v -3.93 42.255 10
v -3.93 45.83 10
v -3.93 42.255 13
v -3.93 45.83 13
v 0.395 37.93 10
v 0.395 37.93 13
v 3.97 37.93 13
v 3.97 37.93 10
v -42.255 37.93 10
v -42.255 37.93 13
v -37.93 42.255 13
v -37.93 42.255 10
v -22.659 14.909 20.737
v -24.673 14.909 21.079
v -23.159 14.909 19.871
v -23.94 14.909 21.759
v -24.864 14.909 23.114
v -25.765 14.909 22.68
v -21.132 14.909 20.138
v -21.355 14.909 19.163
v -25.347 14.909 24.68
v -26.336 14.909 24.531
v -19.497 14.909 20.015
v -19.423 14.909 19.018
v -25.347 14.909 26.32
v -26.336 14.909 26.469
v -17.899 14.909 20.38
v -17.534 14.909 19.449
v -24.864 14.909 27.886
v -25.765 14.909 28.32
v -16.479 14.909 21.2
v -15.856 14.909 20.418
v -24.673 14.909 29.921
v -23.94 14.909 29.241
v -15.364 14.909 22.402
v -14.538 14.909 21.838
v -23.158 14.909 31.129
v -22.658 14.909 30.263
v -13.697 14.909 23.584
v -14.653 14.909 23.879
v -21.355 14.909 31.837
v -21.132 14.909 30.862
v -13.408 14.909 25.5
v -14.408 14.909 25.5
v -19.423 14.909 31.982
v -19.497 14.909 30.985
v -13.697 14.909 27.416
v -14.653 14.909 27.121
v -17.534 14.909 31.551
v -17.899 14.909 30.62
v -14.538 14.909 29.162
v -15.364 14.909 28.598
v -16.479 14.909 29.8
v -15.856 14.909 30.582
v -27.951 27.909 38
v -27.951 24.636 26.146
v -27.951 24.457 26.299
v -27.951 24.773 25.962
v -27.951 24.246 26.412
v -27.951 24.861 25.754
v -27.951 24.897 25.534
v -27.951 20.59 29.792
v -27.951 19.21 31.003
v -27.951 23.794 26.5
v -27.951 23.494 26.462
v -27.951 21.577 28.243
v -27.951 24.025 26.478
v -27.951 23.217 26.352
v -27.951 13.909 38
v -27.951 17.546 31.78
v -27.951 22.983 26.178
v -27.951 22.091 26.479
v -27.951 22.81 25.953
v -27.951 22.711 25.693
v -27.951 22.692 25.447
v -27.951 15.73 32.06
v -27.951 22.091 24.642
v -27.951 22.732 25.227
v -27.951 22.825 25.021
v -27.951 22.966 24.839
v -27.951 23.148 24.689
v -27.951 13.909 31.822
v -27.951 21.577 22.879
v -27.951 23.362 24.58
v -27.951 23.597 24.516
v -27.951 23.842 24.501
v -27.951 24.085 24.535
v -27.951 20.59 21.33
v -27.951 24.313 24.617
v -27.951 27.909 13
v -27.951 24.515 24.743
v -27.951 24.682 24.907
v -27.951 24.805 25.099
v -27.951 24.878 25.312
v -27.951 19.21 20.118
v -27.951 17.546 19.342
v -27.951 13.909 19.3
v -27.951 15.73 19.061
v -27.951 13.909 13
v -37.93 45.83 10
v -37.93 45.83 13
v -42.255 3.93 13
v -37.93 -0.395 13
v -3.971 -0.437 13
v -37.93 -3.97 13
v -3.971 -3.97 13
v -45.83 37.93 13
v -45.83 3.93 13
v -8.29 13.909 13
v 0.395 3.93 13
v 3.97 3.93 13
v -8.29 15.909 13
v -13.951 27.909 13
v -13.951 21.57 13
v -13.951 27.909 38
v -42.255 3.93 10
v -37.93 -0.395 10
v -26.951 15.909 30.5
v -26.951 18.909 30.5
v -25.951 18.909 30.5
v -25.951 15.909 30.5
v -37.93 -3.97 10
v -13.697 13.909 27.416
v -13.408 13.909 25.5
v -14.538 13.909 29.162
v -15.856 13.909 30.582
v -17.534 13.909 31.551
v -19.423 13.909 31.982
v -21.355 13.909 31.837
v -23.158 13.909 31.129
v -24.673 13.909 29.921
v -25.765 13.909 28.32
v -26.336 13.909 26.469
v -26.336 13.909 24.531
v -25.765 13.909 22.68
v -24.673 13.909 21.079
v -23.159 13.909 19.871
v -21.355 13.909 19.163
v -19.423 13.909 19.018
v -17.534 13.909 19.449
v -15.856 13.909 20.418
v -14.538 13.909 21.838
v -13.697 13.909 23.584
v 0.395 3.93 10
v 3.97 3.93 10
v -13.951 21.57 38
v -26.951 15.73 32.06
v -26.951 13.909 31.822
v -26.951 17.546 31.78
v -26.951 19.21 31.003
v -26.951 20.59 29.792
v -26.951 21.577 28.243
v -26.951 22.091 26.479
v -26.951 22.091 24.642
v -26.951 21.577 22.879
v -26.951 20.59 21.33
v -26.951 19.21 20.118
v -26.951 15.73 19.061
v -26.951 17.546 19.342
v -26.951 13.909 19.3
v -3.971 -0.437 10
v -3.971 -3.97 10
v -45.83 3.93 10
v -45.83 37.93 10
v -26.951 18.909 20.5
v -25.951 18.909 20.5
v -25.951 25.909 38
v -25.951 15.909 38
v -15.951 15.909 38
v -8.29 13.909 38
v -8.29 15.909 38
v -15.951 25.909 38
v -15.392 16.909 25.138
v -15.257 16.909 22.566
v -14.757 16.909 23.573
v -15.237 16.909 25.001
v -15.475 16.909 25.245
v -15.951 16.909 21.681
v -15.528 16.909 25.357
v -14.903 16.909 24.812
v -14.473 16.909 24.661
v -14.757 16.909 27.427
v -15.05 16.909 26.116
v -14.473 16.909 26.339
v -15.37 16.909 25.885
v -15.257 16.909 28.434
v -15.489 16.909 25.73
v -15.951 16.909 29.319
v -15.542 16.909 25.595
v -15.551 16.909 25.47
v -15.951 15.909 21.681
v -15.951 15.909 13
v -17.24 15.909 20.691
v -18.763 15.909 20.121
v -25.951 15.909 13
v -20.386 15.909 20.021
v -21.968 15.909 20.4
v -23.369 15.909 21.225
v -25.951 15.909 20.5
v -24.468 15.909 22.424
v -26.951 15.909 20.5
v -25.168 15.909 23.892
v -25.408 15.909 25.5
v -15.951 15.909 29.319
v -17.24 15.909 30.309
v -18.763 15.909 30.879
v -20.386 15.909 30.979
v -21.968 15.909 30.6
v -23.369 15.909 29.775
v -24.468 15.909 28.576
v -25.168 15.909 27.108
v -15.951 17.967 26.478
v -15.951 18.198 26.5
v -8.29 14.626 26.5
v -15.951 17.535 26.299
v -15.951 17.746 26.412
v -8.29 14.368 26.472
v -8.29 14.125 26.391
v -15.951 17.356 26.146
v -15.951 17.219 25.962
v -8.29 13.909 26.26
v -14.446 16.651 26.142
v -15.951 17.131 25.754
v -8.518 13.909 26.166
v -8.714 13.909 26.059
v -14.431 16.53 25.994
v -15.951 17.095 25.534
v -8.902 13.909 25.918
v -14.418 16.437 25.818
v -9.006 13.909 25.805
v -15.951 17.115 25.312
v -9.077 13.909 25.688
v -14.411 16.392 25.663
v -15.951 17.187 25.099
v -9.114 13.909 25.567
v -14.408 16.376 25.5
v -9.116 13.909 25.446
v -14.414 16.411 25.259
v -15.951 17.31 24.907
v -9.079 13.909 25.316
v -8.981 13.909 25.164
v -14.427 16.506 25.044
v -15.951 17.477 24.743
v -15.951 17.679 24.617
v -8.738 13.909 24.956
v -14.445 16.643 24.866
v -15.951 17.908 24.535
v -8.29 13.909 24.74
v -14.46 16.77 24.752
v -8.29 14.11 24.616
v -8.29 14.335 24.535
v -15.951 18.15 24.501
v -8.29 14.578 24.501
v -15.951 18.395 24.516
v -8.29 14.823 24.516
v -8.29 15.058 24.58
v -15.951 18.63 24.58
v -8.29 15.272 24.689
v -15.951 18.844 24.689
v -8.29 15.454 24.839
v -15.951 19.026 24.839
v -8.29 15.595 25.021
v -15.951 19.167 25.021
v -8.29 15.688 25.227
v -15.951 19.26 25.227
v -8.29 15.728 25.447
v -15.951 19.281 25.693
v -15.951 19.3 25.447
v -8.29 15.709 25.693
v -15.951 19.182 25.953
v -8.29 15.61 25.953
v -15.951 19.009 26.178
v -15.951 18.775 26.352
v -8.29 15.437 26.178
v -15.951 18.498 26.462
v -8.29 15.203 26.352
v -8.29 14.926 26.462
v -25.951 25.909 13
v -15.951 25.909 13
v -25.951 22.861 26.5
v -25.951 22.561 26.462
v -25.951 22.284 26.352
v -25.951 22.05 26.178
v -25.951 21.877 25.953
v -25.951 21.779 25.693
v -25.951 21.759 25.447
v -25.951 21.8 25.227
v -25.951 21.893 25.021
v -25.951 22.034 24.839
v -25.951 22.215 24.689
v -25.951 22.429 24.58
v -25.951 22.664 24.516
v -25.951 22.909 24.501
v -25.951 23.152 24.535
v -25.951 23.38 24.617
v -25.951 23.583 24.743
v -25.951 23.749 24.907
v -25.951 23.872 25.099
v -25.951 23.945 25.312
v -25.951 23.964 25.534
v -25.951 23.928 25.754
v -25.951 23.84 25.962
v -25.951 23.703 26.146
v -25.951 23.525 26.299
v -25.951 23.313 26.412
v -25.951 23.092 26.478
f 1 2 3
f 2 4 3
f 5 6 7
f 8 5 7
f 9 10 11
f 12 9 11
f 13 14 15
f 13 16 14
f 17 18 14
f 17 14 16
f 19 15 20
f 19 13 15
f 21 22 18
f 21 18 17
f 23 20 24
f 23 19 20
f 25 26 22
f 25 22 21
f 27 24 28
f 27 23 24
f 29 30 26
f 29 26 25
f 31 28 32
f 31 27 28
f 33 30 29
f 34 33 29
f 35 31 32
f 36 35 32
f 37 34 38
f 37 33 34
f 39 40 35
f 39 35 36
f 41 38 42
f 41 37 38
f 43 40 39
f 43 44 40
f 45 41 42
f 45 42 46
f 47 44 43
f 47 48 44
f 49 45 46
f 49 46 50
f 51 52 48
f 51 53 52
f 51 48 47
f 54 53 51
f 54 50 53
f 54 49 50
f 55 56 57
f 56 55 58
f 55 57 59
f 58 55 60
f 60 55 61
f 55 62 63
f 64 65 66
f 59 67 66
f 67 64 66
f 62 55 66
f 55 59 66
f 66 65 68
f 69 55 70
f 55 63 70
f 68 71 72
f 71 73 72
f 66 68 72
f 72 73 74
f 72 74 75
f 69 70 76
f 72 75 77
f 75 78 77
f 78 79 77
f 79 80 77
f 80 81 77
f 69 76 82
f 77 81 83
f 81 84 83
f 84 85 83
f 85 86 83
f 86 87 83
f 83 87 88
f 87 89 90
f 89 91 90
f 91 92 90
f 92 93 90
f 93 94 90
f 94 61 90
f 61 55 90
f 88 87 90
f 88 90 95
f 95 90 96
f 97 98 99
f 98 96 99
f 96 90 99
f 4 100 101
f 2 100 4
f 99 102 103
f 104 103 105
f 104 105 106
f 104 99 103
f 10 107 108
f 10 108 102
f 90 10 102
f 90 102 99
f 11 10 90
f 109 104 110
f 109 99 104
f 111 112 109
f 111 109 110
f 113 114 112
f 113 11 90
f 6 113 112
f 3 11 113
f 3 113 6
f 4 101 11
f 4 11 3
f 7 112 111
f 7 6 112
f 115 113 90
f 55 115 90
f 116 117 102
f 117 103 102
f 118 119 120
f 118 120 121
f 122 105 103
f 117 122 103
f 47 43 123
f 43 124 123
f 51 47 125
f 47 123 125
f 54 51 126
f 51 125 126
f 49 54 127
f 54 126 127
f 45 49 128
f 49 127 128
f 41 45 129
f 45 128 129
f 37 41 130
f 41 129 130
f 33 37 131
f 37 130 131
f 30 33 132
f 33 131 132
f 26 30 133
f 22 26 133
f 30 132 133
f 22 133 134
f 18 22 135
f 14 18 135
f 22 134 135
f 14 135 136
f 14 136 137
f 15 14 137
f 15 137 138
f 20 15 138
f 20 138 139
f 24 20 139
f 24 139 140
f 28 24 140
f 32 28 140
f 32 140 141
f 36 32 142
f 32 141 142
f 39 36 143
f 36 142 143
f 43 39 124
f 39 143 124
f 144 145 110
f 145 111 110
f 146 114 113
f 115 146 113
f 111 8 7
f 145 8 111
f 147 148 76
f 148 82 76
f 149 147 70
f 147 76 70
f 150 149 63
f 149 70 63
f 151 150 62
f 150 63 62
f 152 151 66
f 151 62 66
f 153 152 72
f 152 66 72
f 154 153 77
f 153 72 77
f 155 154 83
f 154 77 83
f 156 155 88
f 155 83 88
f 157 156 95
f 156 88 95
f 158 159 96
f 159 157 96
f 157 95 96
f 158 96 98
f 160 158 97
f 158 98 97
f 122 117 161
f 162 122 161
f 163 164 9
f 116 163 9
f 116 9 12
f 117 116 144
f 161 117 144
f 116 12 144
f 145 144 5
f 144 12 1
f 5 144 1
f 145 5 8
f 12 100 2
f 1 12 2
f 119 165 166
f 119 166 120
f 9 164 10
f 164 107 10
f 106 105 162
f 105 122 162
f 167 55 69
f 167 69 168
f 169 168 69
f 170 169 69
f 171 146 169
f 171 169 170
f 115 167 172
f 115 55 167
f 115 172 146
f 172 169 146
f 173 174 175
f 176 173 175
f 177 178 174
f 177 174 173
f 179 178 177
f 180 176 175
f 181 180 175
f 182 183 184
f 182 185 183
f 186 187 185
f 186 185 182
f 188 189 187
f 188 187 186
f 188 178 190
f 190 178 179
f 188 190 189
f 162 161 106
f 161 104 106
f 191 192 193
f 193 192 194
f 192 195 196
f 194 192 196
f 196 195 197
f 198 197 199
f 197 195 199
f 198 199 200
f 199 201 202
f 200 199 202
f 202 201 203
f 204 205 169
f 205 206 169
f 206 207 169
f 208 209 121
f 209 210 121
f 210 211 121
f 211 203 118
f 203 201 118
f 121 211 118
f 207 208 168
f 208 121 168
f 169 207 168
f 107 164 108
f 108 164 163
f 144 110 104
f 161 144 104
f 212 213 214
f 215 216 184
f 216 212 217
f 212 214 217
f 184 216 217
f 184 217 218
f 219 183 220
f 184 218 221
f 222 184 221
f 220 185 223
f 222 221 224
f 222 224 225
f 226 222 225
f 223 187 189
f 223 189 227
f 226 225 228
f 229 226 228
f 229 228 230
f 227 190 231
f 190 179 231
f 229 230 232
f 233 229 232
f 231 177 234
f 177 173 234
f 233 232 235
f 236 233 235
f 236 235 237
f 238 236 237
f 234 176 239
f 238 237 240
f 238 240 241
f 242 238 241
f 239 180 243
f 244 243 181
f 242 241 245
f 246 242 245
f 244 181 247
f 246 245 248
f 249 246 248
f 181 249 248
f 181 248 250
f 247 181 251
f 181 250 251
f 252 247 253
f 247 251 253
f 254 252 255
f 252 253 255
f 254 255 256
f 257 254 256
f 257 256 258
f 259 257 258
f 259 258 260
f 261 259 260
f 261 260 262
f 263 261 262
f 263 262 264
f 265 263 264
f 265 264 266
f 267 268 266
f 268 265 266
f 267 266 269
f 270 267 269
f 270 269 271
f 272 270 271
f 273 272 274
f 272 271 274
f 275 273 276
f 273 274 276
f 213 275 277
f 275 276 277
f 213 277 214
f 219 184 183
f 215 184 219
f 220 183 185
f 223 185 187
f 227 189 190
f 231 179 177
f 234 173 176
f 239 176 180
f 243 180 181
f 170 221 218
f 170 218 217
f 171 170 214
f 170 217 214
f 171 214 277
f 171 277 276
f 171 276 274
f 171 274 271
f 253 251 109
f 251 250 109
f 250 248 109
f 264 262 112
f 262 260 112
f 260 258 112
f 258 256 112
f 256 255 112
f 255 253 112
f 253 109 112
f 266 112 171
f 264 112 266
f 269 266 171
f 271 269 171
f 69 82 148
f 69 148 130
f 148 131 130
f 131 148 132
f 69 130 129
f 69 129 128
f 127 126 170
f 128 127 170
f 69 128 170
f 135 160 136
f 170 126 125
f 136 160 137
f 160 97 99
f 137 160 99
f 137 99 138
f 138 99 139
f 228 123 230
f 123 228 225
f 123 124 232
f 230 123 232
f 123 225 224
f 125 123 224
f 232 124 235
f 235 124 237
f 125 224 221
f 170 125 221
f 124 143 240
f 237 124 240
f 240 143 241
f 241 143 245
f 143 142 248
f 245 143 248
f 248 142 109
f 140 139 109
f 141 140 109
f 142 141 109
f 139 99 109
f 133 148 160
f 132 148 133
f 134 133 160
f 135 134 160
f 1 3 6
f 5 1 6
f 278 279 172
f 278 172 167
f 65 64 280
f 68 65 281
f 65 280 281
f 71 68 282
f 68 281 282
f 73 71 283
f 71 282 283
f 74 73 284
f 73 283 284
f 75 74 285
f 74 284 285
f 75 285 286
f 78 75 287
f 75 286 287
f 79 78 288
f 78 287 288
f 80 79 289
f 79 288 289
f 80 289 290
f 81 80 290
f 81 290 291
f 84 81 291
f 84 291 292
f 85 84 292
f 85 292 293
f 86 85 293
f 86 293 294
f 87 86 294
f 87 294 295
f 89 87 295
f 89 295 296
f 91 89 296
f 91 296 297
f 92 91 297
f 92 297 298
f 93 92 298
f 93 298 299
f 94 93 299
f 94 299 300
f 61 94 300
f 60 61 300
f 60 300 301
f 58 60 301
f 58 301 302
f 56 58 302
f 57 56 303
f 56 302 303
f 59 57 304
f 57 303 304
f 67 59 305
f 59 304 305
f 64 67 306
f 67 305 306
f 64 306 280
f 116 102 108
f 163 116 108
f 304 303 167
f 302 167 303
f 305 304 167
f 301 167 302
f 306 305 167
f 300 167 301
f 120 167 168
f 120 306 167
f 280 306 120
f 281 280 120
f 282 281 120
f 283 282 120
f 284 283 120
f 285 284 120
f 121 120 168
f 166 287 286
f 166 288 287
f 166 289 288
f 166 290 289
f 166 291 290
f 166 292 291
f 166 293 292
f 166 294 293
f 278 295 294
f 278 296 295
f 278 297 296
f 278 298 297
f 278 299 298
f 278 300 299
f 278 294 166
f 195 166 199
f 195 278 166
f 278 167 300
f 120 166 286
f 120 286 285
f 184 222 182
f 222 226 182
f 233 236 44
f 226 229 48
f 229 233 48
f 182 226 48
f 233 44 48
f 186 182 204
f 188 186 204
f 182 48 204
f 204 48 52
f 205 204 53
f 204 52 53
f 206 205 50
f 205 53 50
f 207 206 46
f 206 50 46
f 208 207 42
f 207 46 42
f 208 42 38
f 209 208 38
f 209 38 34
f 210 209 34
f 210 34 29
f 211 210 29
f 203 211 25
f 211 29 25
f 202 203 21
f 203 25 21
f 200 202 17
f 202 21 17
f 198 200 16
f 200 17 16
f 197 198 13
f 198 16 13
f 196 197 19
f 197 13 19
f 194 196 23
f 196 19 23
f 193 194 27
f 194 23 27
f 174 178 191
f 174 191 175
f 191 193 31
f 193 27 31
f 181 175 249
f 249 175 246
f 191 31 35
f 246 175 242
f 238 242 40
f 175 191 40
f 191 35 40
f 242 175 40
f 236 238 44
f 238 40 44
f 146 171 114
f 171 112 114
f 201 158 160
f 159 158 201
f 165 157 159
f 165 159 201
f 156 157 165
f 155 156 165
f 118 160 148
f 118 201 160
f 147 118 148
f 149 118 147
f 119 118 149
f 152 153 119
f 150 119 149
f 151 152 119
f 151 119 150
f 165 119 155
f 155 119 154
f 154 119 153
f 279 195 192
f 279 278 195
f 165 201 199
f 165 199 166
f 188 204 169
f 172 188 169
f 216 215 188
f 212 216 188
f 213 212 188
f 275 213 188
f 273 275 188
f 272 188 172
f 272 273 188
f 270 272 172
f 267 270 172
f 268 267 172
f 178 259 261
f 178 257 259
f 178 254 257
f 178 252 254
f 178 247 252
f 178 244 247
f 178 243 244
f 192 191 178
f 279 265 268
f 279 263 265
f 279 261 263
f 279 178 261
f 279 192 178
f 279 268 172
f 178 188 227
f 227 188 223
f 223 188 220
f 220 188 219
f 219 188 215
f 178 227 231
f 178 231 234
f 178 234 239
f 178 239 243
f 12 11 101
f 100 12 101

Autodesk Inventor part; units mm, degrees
ref_plane "YZ Plane" through (0, 0, 0) normal (1, 0, 0) x (0, 1, 0)
ref_plane "XZ Plane" through (0, 0, 0) normal (0, 1, 0) x (-1, 0, 0)
ref_plane "Work Plane1" through (0, 0, 10) normal (0, 0, 1) x (1, 0, 0)
sketch "Sketch1" plane through (0, 0, 10) normal (0, 0, 1) x (1, 0, 0)
  line L0 (-4.0299, -0.3538) -> (-2.2322, 1.4439) construction
  arc A0 (-1.4439, 2.2322) -> (-2.2322, 1.4439) centre (-0.9299, 0.9299) ccw construction
  line L1 (-1.4439, 2.2322) -> (0.3538, 4.0299) construction
  line L2 (-37.8299, 42.8299) -> (-37.8299, 37.8299) construction
  line L3 (-37.8299, 37.8299) -> (-42.9208, 37.8299) construction
  line L4 (-37.8299, 42.2137) -> (-37.8299, 45.8299) construction
  line L5 (-37.8299, 45.8299) -> (-4.0299, 45.8299) construction
  line L6 (-4.0299, 45.8299) -> (-4.0299, 42.2137) construction
  line L7 (-4.0299, 4.0299) -> (0.3538, 4.0299) projected
  circle A1 centre (-20.9299, 20.9299) radius 17.5 projected
  line L8 (-20.9299, 58.9723) -> (17.1124, 20.9299) construction
  line L9 (17.1124, 20.9299) -> (-20.9299, -17.1124) construction
  line L10 (-20.9299, -17.1124) -> (-58.9723, 20.9299) construction
  line L11 (-58.9723, 20.9299) -> (-20.9299, 58.9723) construction
  line L12 (-20.9299, 58.9723) -> (-20.9299, -17.1124) construction
  line L13 (17.1124, 20.9299) -> (-58.9723, 20.9299) construction
  line L14 (-20.9299, 58.9723) -> (32.8701, 58.9723) construction
  line L15 (-43.4299, 43.4299) -> (1.5701, 43.4299) construction
  line L16 (1.5701, 43.4299) -> (1.5701, -1.5701) construction
  line L17 (1.5701, -1.5701) -> (-43.4299, -1.5701) construction
  line L18 (-43.4299, -1.5701) -> (-43.4299, 43.4299) construction
  line L19 (-43.4299, 43.4299) -> (1.5701, -1.5701) construction
  line L20 (1.5701, 43.4299) -> (-43.4299, -1.5701) construction
  line L21 (-43.4299, 5.3876) -> (-43.4299, 36.4723)
  line L22 (-43.4299, 36.4723) -> (-36.4723, 43.4299)
  line L23 (-36.4723, 43.4299) -> (-5.3876, 43.4299)
  line L24 (-5.3876, 43.4299) -> (1.5701, 36.4723)
  line L25 (1.5701, 36.4723) -> (1.5701, 5.3876)
  line L26 (1.5701, 5.3876) -> (-5.3876, -1.5701)
  line L27 (-5.3876, -1.5701) -> (-36.4723, -1.5701)
  line L28 (-36.4723, -1.5701) -> (-43.4299, 5.3876)
  line L29 (-4.0299, 42.2137) -> (-37.8299, 42.2137) projected
  line L30 (-4.0299, -0.3538) -> (-4.0299, 4.0299) projected
  circle A2 centre (-20.9299, 20.9299) radius 1.5
  line L31 (-10.9299, 10.9299) -> (-30.9299, 10.9299) construction
  line L32 (-30.9299, 10.9299) -> (-30.9299, 30.9299) construction
  line L33 (-30.9299, 30.9299) -> (-10.9299, 30.9299) construction
  line L34 (-10.9299, 30.9299) -> (-10.9299, 10.9299) construction
  line L35 (-10.9299, 10.9299) -> (-30.9299, 30.9299) construction
  line L36 (-30.9299, 10.9299) -> (-10.9299, 30.9299) construction
  circle A3 centre (-30.9299, 30.9299) radius 1.4
  circle A4 centre (-30.9299, 10.9299) radius 1.4
  circle A5 centre (-10.9299, 10.9299) radius 1.4
  line L37 (-45.8299, 37.8299) -> (-42.0723, 37.8299) construction
  line L38 (-42.1723, 37.7299) -> (-45.8299, 37.7299)
  line L39 (-45.8299, 37.7299) -> (-45.8299, 4.1299)
  line L40 (-45.8299, 4.1299) -> (-42.1723, 4.1299)
  line L41 (-42.1723, 4.1299) -> (-42.1723, 37.7299)
  line L42 (-45.8299, 4.0299) -> (-42.0723, 4.0299) construction
  line L43 (-45.8299, 37.8299) -> (-42.0723, 37.8299) projected
  line L44 (-37.7299, 45.8299) -> (-4.1299, 45.8299)
  line L45 (-4.1299, 45.8299) -> (-4.1299, 42.1723)
  line L46 (-4.1299, 42.1723) -> (-37.7299, 42.1723)
  line L47 (-37.7299, 42.1723) -> (-37.7299, 45.8299)
  line L48 (0.4701, 37.8299) -> (0.4701, 4.0299) construction
  line L49 (0.4701, 4.0299) -> (3.9701, 4.0299) construction
  line L50 (3.9701, 37.8299) -> (3.9701, 4.0299) construction
  line L51 (0.4701, 37.8299) -> (3.9701, 37.8299) construction
  line L52 (-45.8299, -3.9701) -> (-4.0299, -3.9701) construction
  line L53 (0.3124, 37.7299) -> (3.9701, 37.7299)
  line L54 (3.9701, 37.7299) -> (3.9701, 4.1299)
  line L55 (3.9701, 4.1299) -> (0.3124, 4.1299)
  line L56 (0.3124, 4.1299) -> (0.3124, 37.7299)
  line L57 (-4.1713, -0.3538) -> (-37.7299, -0.3538)
  line L58 (-37.7299, -0.3538) -> (-37.7299, -3.9701)
  line L59 (-37.7299, -3.9701) -> (-4.1713, -3.9701)
  line L60 (-4.1713, -3.9701) -> (-4.1713, -0.3538)
  point P0 (-37.8299, 4.0299)
  dimension "d18" = 53.8
  dimension "d19" = 45
  dimension "d20" = 53.8
  dimension "d21" = 45
  dimension "d22" = 45
  dimension "d30" = 20
  dimension "d31" = 20
  dimension "d32" = 2.8
  dimension "d33" = 2.8
  dimension "d34" = 2.8
  dimension "d35" = 3
  dimension "d36" = 0.1
  dimension "d37" = 0.1
  dimension "d38" = 0.1
  dimension "d39" = 0.1
extrude "Extrusion1" add sketch "Sketch1" along normal blind 3 contours L30 L26 L57 L28 L41 L22 L46 L24 L56 L7 | L7 L26 L30 | L56 L24 L25 L26 | L26 L25 L24 L53 L54 L55 | L60 L59 L58 L57 L28 L27 L26 | L26 L27 L28 L57 | L46 L22 L29 L24 | L24 L29 L45 | L40 L39 L38 L22 L21 L28 | L28 L21 L22 L41 | L29 L22 L23 L24 | L24 L23 L22 L29 L47 L44 L45 | L47 L29 L22 | A1 | A2 | A3 | A4 | A5
sketch "Skizze4" plane through (0, 0, 13) normal (0, 0, 1) x (1, 0, 0)
  line L0 (-37.7299, 42.1723) -> (-42.1723, 37.7299) projected
  line L1 (-42.1723, 37.7299) -> (-45.8299, 37.7299) projected
  line L2 (-45.8299, 37.7299) -> (-45.8299, 4.1299) construction
  line L3 (-45.8299, 4.1299) -> (-42.1723, 4.1299) projected
  line L4 (-42.1723, 4.1299) -> (-37.6885, -0.3538) projected
  line L5 (-37.6885, -0.3538) -> (-37.7299, -0.3538) projected
  line L6 (-37.7299, -0.3538) -> (-37.7299, -3.9701) projected
  line L7 (-37.7299, -3.9701) -> (-4.1713, -3.9701) construction
  line L8 (-4.1713, -3.9701) -> (-4.1713, -0.3538) projected
  line L9 (-4.1713, -0.3538) -> (0.3124, 4.1299) projected
  line L10 (0.3124, 4.1299) -> (3.9701, 4.1299) projected
  line L11 (3.9701, 4.1299) -> (3.9701, 37.7299) construction
  line L12 (3.9701, 37.7299) -> (0.3124, 37.7299) projected
  line L13 (0.3124, 37.7299) -> (-4.1299, 42.1723) projected
  line L14 (-4.1299, 42.1723) -> (-4.1299, 45.8299) projected
  line L15 (-4.1299, 45.8299) -> (-37.7299, 45.8299) construction
  line L16 (-37.7299, 45.8299) -> (-37.7299, 42.1723) projected
  line L17 (-37.9299, 46.0299) -> (-3.9299, 46.0299) construction
  line L18 (-3.9299, 46.0299) -> (-3.9299, 42.2551)
  line L19 (-3.9299, 42.2551) -> (0.3953, 37.9299)
  line L20 (0.3953, 37.9299) -> (4.1701, 37.9299)
  line L21 (4.1701, 37.9299) -> (4.1701, 3.9299) construction
  line L22 (4.1701, 3.9299) -> (0.3953, 3.9299)
  line L23 (0.3953, 3.9299) -> (-3.9713, -0.4367)
  line L24 (-3.9713, -0.4367) -> (-3.9713, -4.1701)
  line L25 (-3.9713, -4.1701) -> (-37.9299, -4.1701) construction
  line L26 (-37.9299, -4.1701) -> (-37.9299, -0.3953)
  line L27 (-37.9299, -0.3953) -> (-42.2551, 3.9299)
  line L28 (-42.2551, 3.9299) -> (-46.0299, 3.9299)
  line L29 (-46.0299, 3.9299) -> (-46.0299, 37.9299) construction
  line L30 (-46.0299, 37.9299) -> (-42.2551, 37.9299)
  line L31 (-42.2551, 37.9299) -> (-37.9299, 42.2551)
  line L32 (-37.9299, 42.2551) -> (-37.9299, 46.0299)
  line L33 (-45.8299, 37.7299) -> (-45.8299, 37.9299)
  line L34 (-4.1299, 45.8299) -> (-37.7299, 45.8299) projected
  line L35 (-37.7299, 45.8299) -> (-37.9299, 45.8299)
  line L36 (-4.1299, 45.8299) -> (-3.9299, 45.8299)
  line L37 (3.9701, 37.7299) -> (3.9701, 37.9299)
  line L38 (3.9701, 4.1299) -> (3.9701, 37.7299) projected
  line L39 (3.9701, 4.1299) -> (3.9701, 3.9299)
  line L40 (-4.1713, -3.9701) -> (-3.9713, -3.9701)
  line L41 (-37.7299, -3.9701) -> (-37.9299, -3.9701)
  line L42 (-45.8299, 4.1299) -> (-45.8299, 3.9299)
  point P0 (0, 0)
  dimension "d40" = 0.2
extrude "IM_offset" add sketch "Skizze4" against normal up to surface (3 mm away)
ref_plane "Arbeitsebene5" through (-20.9299, 3.9299, 10) normal (1, 0, 0) x (0, 0, -1)
ref_plane "Arbeitsebene6" through (-37.9299, 20.9299, 10) normal (0, 1, 0) x (1, 0, 0)
sketch "Skizze25" plane through (0, 0, 13) normal (0, 0, 1) x (1, 0, 0)
  line L0 (3.9701, 3.9299) -> (3.9701, 37.9299) projected
  line L1 (3.9701, 37.9299) -> (0.3953, 37.9299) projected
  line L2 (0.3953, 37.9299) -> (-3.9299, 42.2551) projected
  line L3 (-3.9299, 42.2551) -> (-3.9299, 45.8299) projected
  line L4 (-3.9299, 45.8299) -> (-37.9299, 45.8299) projected
  line L5 (-37.9299, 45.8299) -> (-37.9299, 42.2551) projected
  line L6 (-37.9299, 42.2551) -> (-42.2551, 37.9299) projected
  line L7 (-42.2551, 37.9299) -> (-45.8299, 37.9299) projected
  line L8 (-45.8299, 37.9299) -> (-45.8299, 3.9299) projected
  line L9 (-42.2551, 3.9299) -> (-45.8299, 3.9299) projected
  line L10 (-37.9299, -0.3953) -> (-42.2551, 3.9299) projected
  line L11 (-37.9299, -3.9701) -> (-37.9299, -0.3953) projected
  line L12 (-3.9713, -3.9701) -> (-37.9299, -3.9701) projected
  line L13 (-3.9713, -3.9701) -> (-3.9713, -0.4367) projected
  line L14 (-3.9713, -0.4367) -> (0.3953, 3.9299) projected
  line L15 (0.3953, 3.9299) -> (3.9701, 3.9299) projected
  line L16 (-11.384, 9.2627) -> (-32.5972, 30.4759)
  line L17 (-15.9506, 25.9092) -> (-25.9506, 25.9092)
  line L18 (-25.9506, 25.9092) -> (-25.9506, 15.9092)
  line L19 (-25.9506, 15.9092) -> (-15.9506, 15.9092)
  line L20 (-15.9506, 15.9092) -> (-15.9506, 25.9092)
  line L21 (-15.9506, 25.9092) -> (-25.9506, 15.9092) construction
  line L22 (-25.9506, 25.9092) -> (-15.9506, 15.9092) construction
  line L23 (-13.9506, 27.9092) -> (-27.9506, 27.9092)
  line L24 (-27.9506, 27.9092) -> (-27.9506, 13.9092)
  line L25 (-27.9506, 13.9092) -> (-13.9506, 13.9092)
  line L26 (-13.9506, 13.9092) -> (-13.9506, 27.9092)
  line L27 (-15.9506, 20.9092) -> (-13.9506, 20.9092)
  line L28 (-20.9506, 25.9092) -> (-20.9506, 27.9092)
  line L29 (-18.0305, 15.9092) -> (-15.9506, 18.072)
  line L30 (-25.9506, 23.8293) -> (-23.7879, 25.9092)
  line L31 (-27.9506, 27.9092) -> (-25.9506, 27.9092)
  line L32 (-13.9506, 13.9092) -> (-8.2901, 13.9092)
  line L33 (-8.2901, 13.9092) -> (-8.2901, 15.9092)
  line L34 (-8.2901, 15.9092) -> (-13.9506, 15.9092)
  line L35 (-13.9506, 15.9092) -> (-13.9506, 13.9092)
  line L36 (-8.2901, 15.9092) -> (-13.9506, 21.5697)
  point P0 (0, 0)
  point P1 (-20.9506, 20.9092)
  point P2 (-13.9506, 15.9092)
  dimension "d150" = 10
  dimension "d151" = 10
  dimension "d152" = 2
  dimension "d154" = 7
extrude "Extrusion21" add sketch "Skizze25" along normal blind 25 contours L19 L20 L27 L26 L25 L16 | L16 L25 L24 L18 L19 | L16 L24 L23 L28 L17 L18 | L26 L34 L33 L32 | L20 L17 L28 L23 L26 L27 | L26 L36 L34
ref_plane "Arbeitsebene10" through (0, 0, 42) normal (0, 0, 1) x (1, 0, 0)
ref_plane "Arbeitsebene9" through (-28.9506, 12.9092, 13) normal (-1, 0, 0) x (0, 0, 1)
sketch "Skizze28" plane through (-28.9506, 12.9092, 13) normal (-1, 0, 0) x (0, 0, 1)
  line L0 (0, 3) -> (0, 13) projected
  line L1 (0, 3) -> (25, 3) projected
  line L2 (25, 13) -> (25, 3) projected
  line L3 (0, 13) -> (25, 13) projected
  line L4 (17.5, 3) -> (7.5, 3)
  line L5 (7.5, 3) -> (7.5, 6)
  line L6 (7.5, 6) -> (17.5, 6)
  line L7 (17.5, 6) -> (17.5, 3)
  line L8 (17.5, 3) -> (7.5, 6) construction
  line L9 (7.5, 3) -> (17.5, 6) construction
  point P0 (-13, -12.9092)
  point P1 (12.5, 4.5)
  point P2 (17.5, 3)
  point P3 (17.5, 13)
  point P4 (7.5, 13)
  dimension "d187" = 10
  dimension "d188" = 3
extrude "Extrusion24" cut sketch "Skizze28" against normal blind 3 contours L5 L6 L7 L1
sketch "Skizze34" plane through (-27.9506, 13.9092, 13) normal (0, -1, 0) x (1, 0, 0)
  line L0 (19.6605, 0) -> (0, 0) projected
  line L1 (19.6605, 0) -> (19.6605, 25) projected
  line L2 (0, 25) -> (19.6605, 25) projected
  line L3 (0, 0) -> (0, 25) projected
  circle A0 centre (8.0421, 12.5) radius 5.5
  point P0 (27.9506, -13)
  dimension "d192" = 11
extrude "Extrusion30" cut sketch "Skizze34" against normal blind 3 contours A0
sketch "Skizze35" plane through (-27.9506, 13.9092, 13) normal (0, -1, 0) x (1, 0, 0)
  circle A0 centre (8.0421, 12.5) radius 5.5 projected
  circle A1 centre (8.0421, 12.5) radius 6.5
  point P0 (27.9506, -13)
  dimension "d195" = 13
extrude "Extrusion31" cut sketch "Skizze35" against normal blind 1 contours A0 | A1
sketch "Skizze36" plane through (-27.9506, 13.9092, 13) normal (-1, 0, 0) x (0, 0, 1)
  circle A0 centre (12.5608, 1.7467) radius 6.5
  point P0 (-13, -13.9092)
  dimension "d202" = 13
extrude "Extrusion32" cut sketch "Skizze36" against normal blind 1
ref_plane "Arbeitsebene12" through (-8.2901, 13.9092, 13) normal (0.9063, -0.4226, 0) x (0, 0, 1)
sketch "Skizze37" plane through (-8.2901, 13.9092, 13) normal (0.9063, -0.4226, 0) x (0, 0, 1)
  circle A0 centre (12.5, -0.6497) radius 1
  ellipse E0 centre (12.5, 4.9101) end of major axis (6, 4.9101) minor radius 2.747 projected
  point P0 (-13, 9.1025)
  dimension "d204" = 2
extrude "Extrusion33" cut sketch "Skizze37" against normal through all contours A0
properties part number "20_Cube_Insert_Lightsheet_FEPTube_Flowcube_small_v3"
